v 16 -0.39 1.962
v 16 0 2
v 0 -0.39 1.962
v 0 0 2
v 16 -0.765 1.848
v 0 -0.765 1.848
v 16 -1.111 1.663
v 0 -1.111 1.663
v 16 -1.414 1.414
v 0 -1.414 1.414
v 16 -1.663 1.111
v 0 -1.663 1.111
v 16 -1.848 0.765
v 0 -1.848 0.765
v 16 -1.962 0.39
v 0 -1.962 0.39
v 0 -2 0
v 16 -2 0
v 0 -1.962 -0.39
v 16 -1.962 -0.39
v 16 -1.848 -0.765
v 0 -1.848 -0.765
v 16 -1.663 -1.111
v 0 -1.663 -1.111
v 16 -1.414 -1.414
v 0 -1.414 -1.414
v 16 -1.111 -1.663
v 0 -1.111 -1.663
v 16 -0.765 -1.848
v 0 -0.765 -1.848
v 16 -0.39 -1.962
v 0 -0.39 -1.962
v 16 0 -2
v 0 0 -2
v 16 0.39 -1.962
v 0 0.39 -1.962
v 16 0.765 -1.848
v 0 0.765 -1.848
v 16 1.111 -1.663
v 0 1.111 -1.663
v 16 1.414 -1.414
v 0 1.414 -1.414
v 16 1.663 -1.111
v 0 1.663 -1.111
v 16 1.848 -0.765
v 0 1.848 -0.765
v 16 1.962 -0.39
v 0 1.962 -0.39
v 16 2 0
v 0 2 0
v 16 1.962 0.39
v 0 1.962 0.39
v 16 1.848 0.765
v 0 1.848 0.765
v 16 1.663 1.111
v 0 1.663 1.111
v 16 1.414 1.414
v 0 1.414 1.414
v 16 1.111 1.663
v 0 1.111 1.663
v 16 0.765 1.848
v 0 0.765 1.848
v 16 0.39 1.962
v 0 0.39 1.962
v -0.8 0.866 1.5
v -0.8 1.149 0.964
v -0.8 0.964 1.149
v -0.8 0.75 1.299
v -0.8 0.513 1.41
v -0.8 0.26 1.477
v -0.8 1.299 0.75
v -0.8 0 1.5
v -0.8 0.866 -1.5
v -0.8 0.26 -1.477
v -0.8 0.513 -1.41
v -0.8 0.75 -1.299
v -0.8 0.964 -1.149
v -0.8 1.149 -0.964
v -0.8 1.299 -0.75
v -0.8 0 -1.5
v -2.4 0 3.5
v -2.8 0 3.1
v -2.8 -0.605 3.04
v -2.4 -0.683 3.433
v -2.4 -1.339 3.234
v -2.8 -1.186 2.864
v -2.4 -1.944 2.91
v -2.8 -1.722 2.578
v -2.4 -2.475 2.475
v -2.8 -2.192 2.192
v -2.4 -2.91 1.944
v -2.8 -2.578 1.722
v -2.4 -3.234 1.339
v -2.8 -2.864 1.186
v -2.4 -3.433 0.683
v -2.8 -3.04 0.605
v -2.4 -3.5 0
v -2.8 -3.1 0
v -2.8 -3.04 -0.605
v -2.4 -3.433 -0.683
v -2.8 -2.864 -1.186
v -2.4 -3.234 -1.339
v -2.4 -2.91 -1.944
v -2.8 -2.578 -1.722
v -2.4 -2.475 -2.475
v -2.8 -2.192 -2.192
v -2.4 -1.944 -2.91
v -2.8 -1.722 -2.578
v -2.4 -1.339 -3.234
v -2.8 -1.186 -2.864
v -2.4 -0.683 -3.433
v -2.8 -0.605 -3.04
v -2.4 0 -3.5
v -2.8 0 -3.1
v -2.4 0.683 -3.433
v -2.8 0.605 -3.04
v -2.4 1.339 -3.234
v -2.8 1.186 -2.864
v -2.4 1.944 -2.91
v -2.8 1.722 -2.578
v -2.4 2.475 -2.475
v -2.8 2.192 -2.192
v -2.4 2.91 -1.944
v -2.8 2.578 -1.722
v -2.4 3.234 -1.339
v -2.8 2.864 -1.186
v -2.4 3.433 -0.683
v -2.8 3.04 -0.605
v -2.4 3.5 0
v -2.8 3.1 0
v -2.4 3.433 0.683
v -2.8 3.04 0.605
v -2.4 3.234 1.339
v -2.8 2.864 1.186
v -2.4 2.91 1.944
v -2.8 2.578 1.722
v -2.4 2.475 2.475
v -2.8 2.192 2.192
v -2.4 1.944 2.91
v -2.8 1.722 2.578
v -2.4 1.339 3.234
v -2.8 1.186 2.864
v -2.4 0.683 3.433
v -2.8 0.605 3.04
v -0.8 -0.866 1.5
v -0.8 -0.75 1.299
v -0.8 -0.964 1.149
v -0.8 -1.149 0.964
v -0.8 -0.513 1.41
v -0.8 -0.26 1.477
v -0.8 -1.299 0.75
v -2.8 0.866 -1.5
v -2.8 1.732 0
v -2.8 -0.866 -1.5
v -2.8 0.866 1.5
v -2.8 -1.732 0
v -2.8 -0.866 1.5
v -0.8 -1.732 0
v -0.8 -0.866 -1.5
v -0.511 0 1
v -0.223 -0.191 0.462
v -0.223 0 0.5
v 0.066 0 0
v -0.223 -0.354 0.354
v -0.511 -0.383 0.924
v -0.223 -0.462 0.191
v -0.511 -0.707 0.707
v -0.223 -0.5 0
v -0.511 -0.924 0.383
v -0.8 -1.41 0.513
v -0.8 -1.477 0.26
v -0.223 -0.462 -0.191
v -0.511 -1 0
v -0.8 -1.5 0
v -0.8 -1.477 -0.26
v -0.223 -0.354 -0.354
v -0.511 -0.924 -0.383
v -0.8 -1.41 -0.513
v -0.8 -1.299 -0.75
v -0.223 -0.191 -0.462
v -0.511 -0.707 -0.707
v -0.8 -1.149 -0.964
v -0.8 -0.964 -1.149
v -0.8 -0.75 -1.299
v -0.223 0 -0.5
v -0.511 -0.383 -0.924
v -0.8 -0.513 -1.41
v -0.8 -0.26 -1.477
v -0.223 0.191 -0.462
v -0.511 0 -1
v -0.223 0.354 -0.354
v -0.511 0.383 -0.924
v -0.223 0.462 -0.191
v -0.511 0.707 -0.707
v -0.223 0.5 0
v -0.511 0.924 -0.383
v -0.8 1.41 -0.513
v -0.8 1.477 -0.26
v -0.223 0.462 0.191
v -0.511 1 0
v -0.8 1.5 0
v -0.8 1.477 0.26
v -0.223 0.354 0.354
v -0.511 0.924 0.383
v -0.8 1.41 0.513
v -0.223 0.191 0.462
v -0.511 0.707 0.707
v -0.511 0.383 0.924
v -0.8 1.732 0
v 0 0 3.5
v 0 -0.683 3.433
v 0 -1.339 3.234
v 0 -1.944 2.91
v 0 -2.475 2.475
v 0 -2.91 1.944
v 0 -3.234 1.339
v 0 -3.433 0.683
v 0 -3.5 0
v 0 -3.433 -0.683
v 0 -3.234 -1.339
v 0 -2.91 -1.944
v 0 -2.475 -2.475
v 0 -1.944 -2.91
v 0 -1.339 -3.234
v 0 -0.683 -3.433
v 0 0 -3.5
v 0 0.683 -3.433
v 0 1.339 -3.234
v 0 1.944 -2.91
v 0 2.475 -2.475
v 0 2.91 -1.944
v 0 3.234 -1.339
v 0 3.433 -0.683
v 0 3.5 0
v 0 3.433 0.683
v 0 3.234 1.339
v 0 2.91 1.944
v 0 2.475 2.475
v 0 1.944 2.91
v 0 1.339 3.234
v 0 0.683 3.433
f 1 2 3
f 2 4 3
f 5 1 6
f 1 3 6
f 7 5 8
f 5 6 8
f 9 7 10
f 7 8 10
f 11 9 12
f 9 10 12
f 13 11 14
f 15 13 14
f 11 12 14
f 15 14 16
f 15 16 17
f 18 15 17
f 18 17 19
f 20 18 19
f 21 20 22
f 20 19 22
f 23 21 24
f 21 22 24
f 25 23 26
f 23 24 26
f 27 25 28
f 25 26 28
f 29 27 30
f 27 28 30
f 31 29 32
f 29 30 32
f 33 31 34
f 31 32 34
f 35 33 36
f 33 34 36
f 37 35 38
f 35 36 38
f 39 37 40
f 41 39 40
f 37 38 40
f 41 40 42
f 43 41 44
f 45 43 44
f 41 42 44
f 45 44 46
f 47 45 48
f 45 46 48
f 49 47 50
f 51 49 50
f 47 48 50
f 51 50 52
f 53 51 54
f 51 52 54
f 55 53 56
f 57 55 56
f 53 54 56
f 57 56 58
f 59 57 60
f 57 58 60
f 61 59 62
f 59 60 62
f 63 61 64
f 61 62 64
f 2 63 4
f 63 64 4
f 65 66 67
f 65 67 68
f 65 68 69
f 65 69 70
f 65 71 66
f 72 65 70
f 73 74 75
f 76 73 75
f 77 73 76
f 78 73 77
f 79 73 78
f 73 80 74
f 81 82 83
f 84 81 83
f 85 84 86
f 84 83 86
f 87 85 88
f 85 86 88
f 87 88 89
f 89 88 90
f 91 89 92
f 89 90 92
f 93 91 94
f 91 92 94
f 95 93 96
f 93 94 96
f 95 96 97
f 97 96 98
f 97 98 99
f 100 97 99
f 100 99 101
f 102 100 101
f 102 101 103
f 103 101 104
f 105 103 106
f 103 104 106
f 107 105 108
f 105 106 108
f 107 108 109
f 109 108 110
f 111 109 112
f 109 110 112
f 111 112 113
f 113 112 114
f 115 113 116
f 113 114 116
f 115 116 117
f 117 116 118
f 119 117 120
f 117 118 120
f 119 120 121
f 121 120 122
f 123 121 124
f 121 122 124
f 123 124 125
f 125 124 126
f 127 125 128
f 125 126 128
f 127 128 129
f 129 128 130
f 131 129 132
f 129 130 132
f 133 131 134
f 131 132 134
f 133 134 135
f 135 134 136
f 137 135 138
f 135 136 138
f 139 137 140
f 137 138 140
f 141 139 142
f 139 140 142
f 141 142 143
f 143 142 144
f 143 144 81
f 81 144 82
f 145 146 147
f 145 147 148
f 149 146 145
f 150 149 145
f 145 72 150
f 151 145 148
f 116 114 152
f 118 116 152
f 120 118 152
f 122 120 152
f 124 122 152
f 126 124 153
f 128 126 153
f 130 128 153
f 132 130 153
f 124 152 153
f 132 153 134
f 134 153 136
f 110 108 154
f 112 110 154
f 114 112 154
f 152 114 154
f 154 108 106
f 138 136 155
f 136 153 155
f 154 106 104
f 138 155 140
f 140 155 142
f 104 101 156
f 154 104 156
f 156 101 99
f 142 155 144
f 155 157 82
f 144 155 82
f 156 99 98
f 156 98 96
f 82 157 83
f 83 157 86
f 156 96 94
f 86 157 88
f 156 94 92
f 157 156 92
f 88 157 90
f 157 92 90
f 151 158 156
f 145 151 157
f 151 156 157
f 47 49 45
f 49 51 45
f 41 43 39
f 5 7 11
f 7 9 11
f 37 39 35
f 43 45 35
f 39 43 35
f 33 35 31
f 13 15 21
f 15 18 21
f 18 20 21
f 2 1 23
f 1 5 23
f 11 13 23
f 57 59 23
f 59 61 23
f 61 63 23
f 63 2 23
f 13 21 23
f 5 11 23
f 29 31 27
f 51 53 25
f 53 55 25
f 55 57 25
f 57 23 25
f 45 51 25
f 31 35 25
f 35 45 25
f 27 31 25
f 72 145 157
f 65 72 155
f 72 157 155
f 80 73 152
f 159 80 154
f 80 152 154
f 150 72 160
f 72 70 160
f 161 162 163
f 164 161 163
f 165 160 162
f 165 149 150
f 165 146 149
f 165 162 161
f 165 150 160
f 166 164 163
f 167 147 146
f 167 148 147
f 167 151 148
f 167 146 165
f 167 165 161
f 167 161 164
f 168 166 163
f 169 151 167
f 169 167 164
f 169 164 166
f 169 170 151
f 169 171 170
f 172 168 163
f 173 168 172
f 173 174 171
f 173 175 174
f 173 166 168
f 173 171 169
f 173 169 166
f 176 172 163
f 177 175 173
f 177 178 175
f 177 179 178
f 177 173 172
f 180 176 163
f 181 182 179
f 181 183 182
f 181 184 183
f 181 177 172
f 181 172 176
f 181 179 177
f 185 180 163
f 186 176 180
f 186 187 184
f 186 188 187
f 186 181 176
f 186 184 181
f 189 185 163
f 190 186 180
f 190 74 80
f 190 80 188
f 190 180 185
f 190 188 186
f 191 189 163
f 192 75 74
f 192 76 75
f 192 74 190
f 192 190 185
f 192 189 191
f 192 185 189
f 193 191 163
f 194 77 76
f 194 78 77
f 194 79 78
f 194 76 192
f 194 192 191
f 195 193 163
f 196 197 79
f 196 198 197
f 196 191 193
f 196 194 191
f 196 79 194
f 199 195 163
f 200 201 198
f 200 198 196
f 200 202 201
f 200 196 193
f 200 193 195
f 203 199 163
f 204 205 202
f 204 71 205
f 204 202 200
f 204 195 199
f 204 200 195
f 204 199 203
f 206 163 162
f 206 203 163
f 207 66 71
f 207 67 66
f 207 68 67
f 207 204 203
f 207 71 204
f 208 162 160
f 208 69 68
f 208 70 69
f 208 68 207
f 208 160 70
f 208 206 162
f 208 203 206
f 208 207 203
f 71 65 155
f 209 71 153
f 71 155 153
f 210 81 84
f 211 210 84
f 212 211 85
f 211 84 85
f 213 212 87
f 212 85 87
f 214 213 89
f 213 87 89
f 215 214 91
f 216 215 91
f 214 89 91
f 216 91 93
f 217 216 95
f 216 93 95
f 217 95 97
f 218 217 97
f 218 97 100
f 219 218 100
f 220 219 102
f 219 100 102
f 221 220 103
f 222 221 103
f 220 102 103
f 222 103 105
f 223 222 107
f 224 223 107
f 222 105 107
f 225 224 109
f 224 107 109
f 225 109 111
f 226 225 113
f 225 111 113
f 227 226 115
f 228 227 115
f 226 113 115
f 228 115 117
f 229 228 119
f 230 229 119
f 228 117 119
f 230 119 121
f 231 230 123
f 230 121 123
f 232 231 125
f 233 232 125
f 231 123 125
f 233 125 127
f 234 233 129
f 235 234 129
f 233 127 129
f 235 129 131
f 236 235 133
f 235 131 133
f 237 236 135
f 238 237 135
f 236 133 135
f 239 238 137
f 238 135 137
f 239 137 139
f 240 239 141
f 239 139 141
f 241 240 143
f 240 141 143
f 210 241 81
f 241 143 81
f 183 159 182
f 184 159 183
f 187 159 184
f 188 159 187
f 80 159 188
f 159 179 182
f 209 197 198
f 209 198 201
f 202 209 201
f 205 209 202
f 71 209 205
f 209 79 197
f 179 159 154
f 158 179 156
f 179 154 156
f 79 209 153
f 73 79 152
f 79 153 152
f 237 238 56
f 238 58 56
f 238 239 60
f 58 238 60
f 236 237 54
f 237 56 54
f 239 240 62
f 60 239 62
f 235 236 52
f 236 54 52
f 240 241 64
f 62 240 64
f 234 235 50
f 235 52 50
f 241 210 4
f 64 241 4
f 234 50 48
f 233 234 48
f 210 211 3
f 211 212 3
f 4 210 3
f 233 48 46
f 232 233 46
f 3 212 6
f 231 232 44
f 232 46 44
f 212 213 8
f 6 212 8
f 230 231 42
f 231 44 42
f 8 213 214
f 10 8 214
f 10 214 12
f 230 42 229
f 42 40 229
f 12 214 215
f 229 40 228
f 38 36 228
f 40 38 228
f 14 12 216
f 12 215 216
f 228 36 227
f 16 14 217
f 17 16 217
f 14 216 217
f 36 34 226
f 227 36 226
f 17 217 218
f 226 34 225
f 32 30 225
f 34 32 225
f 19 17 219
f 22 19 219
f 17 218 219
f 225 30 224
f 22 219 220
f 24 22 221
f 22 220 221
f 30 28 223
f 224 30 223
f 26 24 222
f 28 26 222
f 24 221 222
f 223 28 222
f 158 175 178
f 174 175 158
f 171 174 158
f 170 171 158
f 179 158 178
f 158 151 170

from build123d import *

# Parameters (mm, degrees)
CUT_EXTRUDE1_DEPTH = 2
CHAMFER1_SIZE      = 0.4


with BuildPart() as part:
    # Sketch1 → Revolve1 (revolve)
    with BuildSketch(Plane.XY, mode=Mode.PRIVATE) as revolve1_sk:
        Polygon((16, 0), (16, 2), (0, 2), (0, 3.5), (-2.8, 3.5), (-2.8, 0), align=None)
    revolve(revolve1_sk.sketch.rotate(Axis((-2.8, 0, 0), (1, 0, 0)), 90), axis=Axis((-2.8, 0, 0), (1, 0, 0)))

    # Sketch2 → Cut-Extrude1 (cut)
    with BuildSketch(Plane.ZY.offset(2.8)):
        Polygon((0, 1.732050808), (-1.5, 0.866025404), (-1.5, -0.866025404), (0, -1.732050808), (1.5, -0.866025404), (1.5, 0.866025404), align=None)
    extrude(amount=-CUT_EXTRUDE1_DEPTH, mode=Mode.SUBTRACT)

    # Sketch3 → Cut-Revolve1 (revolve, cut)
    with BuildSketch(Plane.XY, mode=Mode.PRIVATE) as cut_revolve1_sk:
        Polygon((0.066025404, 0), (-0.8, 1.5), (-0.8, 0), align=None)
    revolve(cut_revolve1_sk.sketch.rotate(Axis((-0.8, 0, 0), (1, 0, 0)), 90), axis=Axis((-0.8, 0, 0), (1, 0, 0)), mode=Mode.SUBTRACT)

    # Chamfer1
    chamfer1_edges = [part.edges().sort_by_distance(p)[0] for p in [
        (-2.8, 0, -3.5),
    ]]
    chamfer(chamfer1_edges, length=CHAMFER1_SIZE)


solid = part.part
